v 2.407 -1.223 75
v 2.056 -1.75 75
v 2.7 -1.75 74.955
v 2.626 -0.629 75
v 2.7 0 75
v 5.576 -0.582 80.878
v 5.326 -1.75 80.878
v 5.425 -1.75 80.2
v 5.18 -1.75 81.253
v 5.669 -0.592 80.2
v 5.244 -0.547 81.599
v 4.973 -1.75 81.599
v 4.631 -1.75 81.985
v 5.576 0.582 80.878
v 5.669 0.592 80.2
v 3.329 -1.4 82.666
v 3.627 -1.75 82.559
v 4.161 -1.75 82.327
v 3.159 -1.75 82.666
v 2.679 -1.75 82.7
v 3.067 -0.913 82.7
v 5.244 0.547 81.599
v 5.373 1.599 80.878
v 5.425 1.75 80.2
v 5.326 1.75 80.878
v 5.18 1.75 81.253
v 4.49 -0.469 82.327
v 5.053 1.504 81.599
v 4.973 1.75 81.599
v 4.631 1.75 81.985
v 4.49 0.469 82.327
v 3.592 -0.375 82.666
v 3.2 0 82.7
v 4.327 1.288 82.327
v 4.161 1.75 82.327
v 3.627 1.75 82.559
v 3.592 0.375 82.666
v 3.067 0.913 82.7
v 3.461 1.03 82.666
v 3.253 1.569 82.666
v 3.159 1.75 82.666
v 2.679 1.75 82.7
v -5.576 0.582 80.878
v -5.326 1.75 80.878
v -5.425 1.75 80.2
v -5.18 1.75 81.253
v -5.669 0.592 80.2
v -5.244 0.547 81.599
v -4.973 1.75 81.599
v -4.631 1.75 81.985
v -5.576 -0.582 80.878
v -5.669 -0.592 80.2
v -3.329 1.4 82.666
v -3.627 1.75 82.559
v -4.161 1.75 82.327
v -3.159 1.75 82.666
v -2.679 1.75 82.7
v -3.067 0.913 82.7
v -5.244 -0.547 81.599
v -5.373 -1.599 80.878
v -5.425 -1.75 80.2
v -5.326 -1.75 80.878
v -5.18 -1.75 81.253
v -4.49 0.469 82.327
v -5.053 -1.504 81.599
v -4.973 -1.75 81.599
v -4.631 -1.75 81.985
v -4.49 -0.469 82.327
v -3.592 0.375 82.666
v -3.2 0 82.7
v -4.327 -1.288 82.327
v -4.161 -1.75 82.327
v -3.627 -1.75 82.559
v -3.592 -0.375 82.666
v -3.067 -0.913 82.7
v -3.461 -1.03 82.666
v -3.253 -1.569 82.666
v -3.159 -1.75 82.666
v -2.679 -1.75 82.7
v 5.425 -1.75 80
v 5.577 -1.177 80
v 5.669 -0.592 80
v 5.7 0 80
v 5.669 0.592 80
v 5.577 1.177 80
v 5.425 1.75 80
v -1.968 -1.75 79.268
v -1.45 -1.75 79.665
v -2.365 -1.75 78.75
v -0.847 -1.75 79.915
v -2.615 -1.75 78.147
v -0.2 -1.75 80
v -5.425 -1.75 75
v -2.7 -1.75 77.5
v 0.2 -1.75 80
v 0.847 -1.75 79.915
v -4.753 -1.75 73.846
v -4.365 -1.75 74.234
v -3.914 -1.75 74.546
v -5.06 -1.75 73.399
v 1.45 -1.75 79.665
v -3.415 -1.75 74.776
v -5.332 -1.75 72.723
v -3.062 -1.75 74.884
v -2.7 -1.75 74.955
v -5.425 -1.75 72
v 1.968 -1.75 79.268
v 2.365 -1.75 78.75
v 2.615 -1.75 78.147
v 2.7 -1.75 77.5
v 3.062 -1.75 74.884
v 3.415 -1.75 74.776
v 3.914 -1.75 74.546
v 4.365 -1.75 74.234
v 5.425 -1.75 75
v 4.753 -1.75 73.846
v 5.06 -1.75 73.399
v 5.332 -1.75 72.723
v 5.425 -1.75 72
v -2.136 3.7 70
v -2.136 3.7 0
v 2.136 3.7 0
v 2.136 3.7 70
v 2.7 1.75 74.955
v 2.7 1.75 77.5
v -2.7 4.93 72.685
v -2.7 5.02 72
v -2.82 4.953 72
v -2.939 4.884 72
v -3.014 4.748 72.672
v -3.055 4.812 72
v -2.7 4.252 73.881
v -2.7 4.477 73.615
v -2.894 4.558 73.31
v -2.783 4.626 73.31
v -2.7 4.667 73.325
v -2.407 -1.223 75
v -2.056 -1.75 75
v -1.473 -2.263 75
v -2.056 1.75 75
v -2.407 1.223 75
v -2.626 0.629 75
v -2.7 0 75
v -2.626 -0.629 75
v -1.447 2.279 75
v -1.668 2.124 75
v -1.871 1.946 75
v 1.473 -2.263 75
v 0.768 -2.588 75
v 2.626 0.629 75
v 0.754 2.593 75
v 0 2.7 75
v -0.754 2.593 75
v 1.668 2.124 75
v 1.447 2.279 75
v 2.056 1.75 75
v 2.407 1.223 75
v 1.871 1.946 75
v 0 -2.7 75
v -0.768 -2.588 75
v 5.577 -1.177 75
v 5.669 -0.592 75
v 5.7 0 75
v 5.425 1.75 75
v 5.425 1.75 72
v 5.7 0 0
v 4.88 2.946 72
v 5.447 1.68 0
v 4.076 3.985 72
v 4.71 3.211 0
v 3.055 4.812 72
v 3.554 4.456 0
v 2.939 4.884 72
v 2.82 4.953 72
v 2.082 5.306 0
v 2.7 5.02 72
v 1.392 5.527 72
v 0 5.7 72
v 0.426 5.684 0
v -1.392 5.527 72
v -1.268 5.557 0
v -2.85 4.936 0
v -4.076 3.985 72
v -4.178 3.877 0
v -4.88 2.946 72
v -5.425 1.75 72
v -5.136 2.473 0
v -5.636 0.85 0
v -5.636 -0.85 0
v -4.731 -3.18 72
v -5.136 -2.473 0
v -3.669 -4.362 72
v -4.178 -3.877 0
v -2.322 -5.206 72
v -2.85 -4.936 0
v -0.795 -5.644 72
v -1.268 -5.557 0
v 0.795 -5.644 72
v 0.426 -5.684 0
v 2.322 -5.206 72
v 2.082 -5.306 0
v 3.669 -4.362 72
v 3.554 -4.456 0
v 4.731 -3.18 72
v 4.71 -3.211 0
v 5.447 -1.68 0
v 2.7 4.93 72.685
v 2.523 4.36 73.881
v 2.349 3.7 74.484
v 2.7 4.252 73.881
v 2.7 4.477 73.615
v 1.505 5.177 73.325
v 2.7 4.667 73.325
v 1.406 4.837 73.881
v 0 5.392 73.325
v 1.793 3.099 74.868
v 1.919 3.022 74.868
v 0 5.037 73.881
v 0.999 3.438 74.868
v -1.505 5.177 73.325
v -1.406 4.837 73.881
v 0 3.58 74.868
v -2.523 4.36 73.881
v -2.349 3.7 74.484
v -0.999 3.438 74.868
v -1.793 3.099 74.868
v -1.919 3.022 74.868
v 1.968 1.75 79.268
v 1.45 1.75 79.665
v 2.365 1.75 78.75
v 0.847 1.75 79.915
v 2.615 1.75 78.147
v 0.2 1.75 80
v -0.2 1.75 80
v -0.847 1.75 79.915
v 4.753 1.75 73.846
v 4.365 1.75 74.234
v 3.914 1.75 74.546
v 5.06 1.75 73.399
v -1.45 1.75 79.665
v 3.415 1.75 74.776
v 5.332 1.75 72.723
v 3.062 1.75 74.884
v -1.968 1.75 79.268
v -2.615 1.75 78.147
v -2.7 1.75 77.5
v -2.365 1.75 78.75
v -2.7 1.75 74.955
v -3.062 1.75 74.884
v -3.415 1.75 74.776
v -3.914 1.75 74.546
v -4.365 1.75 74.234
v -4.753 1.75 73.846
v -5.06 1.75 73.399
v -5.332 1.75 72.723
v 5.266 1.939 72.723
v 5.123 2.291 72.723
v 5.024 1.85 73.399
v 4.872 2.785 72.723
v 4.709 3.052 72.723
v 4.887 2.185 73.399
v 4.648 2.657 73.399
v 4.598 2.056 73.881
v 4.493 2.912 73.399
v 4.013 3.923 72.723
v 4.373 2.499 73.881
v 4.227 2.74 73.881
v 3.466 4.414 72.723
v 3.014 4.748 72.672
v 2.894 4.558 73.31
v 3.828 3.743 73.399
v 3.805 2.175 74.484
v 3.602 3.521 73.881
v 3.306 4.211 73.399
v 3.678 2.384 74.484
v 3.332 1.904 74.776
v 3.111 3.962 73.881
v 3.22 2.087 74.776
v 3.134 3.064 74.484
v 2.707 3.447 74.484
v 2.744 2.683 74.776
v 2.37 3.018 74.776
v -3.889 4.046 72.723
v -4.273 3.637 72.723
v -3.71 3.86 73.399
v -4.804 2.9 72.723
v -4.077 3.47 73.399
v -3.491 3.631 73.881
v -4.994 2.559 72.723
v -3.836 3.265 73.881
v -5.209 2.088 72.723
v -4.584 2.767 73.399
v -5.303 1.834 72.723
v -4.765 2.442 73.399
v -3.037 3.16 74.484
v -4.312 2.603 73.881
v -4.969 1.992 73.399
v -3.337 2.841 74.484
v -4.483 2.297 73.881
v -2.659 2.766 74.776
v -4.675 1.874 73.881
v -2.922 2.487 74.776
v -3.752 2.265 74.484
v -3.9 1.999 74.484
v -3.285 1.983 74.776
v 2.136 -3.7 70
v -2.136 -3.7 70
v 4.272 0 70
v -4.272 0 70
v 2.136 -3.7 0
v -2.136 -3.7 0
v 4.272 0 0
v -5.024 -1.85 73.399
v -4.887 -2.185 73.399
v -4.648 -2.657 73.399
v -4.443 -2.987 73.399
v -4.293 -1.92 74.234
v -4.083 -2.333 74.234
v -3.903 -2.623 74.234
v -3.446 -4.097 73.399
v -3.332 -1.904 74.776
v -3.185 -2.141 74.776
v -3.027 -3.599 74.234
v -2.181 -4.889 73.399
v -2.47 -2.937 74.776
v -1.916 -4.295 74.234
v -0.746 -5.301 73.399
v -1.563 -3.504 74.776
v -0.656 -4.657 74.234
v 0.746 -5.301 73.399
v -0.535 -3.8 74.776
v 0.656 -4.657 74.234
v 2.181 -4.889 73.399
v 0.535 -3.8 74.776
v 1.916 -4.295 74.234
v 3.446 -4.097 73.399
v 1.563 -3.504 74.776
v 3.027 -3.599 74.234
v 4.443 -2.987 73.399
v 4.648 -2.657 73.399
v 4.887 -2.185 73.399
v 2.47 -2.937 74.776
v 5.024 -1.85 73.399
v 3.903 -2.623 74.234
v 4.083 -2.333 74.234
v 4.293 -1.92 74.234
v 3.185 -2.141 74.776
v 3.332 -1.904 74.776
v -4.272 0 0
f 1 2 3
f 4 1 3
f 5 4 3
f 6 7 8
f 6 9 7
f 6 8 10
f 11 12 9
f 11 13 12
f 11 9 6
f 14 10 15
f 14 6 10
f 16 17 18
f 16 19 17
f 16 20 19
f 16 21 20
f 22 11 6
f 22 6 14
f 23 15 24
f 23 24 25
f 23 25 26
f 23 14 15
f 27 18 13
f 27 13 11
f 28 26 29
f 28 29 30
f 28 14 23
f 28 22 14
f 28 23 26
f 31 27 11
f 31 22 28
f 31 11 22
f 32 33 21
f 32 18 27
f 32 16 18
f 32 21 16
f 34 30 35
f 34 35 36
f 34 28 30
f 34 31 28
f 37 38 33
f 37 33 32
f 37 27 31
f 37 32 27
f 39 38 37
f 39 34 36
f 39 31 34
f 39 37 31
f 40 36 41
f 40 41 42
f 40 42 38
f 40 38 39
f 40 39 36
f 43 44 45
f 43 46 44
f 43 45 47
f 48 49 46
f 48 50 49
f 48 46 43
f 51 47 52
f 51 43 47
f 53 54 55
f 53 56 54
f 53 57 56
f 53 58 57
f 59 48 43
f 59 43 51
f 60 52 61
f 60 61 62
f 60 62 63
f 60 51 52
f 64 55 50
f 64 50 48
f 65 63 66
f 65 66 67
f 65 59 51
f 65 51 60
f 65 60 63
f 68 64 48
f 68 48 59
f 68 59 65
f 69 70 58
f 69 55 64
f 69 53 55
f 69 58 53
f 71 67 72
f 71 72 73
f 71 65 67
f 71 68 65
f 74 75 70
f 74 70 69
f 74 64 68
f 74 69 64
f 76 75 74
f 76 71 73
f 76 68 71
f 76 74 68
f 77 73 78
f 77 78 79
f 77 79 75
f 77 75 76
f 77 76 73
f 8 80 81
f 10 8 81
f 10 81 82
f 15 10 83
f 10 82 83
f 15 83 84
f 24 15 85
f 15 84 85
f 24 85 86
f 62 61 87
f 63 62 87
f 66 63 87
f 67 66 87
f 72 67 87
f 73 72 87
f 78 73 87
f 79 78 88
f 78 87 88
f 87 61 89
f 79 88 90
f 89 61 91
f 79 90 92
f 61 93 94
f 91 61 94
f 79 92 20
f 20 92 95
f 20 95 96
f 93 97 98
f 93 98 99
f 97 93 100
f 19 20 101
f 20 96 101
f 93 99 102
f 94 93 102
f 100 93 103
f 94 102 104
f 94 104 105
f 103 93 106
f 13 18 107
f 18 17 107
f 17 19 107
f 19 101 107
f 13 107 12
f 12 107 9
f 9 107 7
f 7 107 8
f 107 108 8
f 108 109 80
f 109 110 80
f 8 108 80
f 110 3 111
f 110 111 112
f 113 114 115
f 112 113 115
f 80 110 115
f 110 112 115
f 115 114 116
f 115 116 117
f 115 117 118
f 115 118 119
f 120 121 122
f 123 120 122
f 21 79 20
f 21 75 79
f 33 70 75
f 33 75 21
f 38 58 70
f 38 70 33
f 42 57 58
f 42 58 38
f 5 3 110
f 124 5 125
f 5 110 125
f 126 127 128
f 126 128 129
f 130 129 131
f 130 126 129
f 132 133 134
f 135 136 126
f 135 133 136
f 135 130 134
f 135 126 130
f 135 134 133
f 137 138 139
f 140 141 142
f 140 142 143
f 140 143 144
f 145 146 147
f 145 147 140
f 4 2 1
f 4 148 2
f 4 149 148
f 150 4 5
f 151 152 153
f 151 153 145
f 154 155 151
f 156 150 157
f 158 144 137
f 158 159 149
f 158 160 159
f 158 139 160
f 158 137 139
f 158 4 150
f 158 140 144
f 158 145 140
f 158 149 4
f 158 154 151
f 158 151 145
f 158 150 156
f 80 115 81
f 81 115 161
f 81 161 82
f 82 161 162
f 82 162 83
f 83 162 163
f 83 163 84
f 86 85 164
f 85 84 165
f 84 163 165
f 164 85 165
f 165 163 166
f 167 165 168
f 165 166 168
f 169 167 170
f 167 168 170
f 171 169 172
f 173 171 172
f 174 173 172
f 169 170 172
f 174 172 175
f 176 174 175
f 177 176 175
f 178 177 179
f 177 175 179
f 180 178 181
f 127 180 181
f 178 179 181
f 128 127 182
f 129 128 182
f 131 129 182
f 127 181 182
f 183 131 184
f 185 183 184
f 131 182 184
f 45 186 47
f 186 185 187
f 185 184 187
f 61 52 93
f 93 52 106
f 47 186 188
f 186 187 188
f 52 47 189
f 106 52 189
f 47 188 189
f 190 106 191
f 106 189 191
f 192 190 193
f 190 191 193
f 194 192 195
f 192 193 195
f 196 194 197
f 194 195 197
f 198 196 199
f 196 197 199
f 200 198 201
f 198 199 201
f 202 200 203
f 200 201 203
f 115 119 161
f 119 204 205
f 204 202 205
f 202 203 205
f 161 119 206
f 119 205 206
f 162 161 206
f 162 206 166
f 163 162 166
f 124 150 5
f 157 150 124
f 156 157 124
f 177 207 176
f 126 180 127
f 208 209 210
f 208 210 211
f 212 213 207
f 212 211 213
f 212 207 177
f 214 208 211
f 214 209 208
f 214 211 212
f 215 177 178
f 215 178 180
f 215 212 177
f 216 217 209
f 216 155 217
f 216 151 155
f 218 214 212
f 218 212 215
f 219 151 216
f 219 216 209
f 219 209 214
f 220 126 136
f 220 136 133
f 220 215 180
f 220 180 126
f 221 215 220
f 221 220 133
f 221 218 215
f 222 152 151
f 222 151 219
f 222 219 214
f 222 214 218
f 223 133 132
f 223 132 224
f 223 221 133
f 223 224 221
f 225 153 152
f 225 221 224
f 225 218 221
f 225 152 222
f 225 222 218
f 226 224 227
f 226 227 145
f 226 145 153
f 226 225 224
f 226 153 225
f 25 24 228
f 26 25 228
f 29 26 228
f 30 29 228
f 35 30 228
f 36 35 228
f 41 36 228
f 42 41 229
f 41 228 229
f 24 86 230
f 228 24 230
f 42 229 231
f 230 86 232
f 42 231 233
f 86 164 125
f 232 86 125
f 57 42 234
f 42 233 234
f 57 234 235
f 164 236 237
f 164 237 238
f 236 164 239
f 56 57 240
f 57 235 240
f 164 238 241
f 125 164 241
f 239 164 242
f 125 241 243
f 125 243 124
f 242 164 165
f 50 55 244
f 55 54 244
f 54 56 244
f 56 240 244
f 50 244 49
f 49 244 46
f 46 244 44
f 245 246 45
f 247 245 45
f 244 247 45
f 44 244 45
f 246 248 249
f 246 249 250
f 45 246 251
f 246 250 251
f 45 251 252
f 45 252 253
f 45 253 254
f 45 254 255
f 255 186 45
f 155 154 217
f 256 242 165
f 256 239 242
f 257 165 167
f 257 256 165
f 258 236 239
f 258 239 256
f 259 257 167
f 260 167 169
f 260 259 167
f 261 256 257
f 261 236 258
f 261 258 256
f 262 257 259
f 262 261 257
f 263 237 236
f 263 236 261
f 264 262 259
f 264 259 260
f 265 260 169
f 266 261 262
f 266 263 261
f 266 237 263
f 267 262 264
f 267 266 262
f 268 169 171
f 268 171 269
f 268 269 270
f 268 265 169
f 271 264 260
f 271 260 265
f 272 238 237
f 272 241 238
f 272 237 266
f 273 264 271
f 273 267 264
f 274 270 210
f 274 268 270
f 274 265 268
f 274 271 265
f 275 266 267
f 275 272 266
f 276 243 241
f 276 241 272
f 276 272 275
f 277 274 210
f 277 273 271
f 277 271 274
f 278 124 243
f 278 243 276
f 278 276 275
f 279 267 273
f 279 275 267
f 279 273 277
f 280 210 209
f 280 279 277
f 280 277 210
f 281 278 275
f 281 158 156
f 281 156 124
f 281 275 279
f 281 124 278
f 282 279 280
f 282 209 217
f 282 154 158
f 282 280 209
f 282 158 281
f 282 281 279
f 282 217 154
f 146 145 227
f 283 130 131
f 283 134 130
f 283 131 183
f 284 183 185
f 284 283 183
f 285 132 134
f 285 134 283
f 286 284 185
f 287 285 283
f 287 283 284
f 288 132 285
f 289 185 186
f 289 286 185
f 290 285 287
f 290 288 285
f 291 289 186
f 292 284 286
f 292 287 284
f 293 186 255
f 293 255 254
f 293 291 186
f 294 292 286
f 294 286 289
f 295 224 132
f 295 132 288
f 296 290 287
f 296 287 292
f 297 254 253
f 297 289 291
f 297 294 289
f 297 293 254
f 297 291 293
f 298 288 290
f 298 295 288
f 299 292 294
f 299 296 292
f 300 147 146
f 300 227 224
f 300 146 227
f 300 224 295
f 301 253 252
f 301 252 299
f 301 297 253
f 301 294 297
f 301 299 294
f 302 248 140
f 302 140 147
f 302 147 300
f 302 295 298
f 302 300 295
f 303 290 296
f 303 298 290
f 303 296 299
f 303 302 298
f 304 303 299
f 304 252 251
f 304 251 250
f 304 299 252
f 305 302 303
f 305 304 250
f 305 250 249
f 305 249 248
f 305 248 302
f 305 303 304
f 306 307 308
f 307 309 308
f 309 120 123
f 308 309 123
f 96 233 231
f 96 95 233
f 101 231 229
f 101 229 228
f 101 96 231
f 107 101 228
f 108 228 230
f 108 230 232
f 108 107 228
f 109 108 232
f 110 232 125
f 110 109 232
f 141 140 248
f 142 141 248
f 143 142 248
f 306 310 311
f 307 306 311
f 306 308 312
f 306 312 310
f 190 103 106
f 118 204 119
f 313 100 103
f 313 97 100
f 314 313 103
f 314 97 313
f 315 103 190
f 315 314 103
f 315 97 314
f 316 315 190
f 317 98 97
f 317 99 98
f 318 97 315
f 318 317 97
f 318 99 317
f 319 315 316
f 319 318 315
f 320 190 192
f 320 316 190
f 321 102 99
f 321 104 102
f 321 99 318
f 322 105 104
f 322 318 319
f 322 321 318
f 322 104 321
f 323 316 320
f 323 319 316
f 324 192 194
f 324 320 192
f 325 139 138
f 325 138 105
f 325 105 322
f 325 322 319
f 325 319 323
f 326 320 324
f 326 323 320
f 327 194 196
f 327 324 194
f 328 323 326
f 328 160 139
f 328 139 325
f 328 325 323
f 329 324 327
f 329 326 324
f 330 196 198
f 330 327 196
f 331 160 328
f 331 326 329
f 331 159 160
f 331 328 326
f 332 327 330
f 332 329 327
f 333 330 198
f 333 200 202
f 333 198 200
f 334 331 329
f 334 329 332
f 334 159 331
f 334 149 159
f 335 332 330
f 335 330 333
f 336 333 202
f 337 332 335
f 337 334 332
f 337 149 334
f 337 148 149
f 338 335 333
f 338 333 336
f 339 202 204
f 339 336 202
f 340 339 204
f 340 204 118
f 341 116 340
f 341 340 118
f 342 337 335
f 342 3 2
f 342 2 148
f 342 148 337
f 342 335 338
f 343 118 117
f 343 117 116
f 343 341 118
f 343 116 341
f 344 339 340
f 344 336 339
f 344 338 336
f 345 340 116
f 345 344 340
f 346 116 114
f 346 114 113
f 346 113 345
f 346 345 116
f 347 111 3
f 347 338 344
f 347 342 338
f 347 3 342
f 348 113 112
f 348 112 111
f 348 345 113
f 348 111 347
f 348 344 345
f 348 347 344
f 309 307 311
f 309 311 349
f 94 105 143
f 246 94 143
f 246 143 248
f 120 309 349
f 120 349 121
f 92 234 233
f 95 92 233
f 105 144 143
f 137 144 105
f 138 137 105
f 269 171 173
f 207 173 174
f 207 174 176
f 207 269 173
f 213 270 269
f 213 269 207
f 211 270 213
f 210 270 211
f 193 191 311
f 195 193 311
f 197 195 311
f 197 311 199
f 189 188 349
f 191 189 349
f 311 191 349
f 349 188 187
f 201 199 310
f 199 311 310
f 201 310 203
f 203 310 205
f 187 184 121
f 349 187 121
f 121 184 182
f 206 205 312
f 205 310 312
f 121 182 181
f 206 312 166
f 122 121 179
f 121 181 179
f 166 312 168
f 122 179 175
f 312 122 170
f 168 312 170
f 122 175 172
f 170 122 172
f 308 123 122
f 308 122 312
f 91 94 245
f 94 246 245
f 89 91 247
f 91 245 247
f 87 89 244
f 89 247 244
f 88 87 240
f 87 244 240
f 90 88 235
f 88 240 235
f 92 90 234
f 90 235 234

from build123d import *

# Parameters (mm, degrees)
F0_R         = 5.7
F1_DEPTH     = 70
F2_R         = 5.7
F3_DEPTH     = 5
F5_DEPTH     = 5
F6_W         = 5.4
F6_H         = 3.5
F7_DEPTH     = 2.7
F8_R         = 2.5
F9_T4_ANGLE  = 295.1748403761
F9_T9_ANGLE  = 295.1748403761
F9_T15_ANGLE = 295.1748403761
F9_T20_ANGLE = 295.1748403761
F9_T25_ANGLE = 295.1748403761
F9_T31_ANGLE = 295.1748403761


# Not quite as in the source:
# - a fillet or chamfer that OpenCascade refuses, or shapes differently, is made with other operations: its cross-section is extruded or revolved along the edge and cut away or added


with BuildPart() as f1:
    # F0 (on Top) → F1 (new body)
    with BuildSketch(Plane.XY):
        Circle(F0_R)
        Polygon((-2.136195996, -3.7), (-4.272391992, 0), (-2.136195996, 3.7), (2.136195996, 3.7), (4.272391992, 0), (2.136195996, -3.7), align=None, mode=Mode.SUBTRACT)
    extrude(amount=F1_DEPTH)

    # F2 (on face) → F3 (join)
    with BuildSketch(Plane.XY.offset(70)):
        Circle(F2_R)
        Polygon((2.136195996, -3.7), (-2.136195996, -3.7), (-4.272391992, 0), (-2.136195996, 3.7), (2.136195996, 3.7), (4.272391992, 0), align=None, mode=Mode.SUBTRACT)
        Polygon((-4.272391992, 0), (-2.136195996, -3.7), (2.136195996, -3.7), (4.272391992, 0), (2.136195996, 3.7), (-2.136195996, 3.7), align=None)
    extrude(amount=F3_DEPTH)

    # F4 (on face) → F5 (join)
    with BuildSketch(Plane.XY.offset(75)):
        with BuildLine():
            Line((-5.4247119739, -1.75), (-2.7, -1.75))
            Line((-2.7, -1.75), (-2.7, 1.75))
            Line((-2.7, 1.75), (-5.4247119739, 1.75))
            ThreePointArc((-5.4247119739, 1.75), (-5.7, 0), (-5.4247119739, -1.75))
        make_face()
        with BuildLine():
            Line((2.7, -1.75), (5.4247119739, -1.75))
            ThreePointArc((5.4247119739, -1.75), (5.6307574202, -0.8857600546), (5.7, 0))
            ThreePointArc((5.7, 0), (5.6307574202, 0.8857600546), (5.4247119739, 1.75))
            Line((5.4247119739, 1.75), (2.7, 1.75))
            Line((2.7, 1.75), (2.7, -1.75))
        make_face()
    extrude(amount=F5_DEPTH)

    # F6 (on face) → F7 (join)
    with BuildSketch(Plane.XY.offset(80)):
        Rectangle(F6_W, F6_H)
        with BuildLine():
            Line((-2.7, -1.75), (-2.7, 1.75))
            Line((-2.7, 1.75), (-5.4247119739, 1.75))
            ThreePointArc((-5.4247119739, 1.75), (-5.7, 0), (-5.4247119739, -1.75))
            Line((-5.4247119739, -1.75), (-2.7, -1.75))
        make_face()
        with BuildLine():
            Line((5.4247119739, 1.75), (2.7, 1.75))
            Line((2.7, 1.75), (2.7, -1.75))
            Line((2.7, -1.75), (5.4247119739, -1.75))
            ThreePointArc((5.4247119739, -1.75), (5.7, 0), (5.4247119739, 1.75))
        make_face()
    extrude(amount=F7_DEPTH)

    # F8
    f8_edges = [f1.edges().sort_by_distance(p)[0] for p in [
        (-5.7, 0, 82.7),
        (2.7, 0, 80),
        (-2.7, 0, 80),
        (5.7, 0, 82.7),
    ]]
    fillet(f8_edges, radius=F8_R)

    # F9: fillet of radius 3 on 3 edges, made by hand


with BuildPart() as f9_tool2:
    # F9_s3 → F9_t4 (revolve)
    with BuildSketch(Plane(origin=(0, 0, 0), x_dir=(0, 0, 1), z_dir=(0.8442102595, 0.536012162, 0))):
        with BuildLine():
            ThreePointArc((72, -5.7), (74.1213203436, -4.8213203436), (75, -2.7))
            Line((75, -2.7), (75, -5.7))
            Line((75, -5.7), (72, -5.7))
        make_face()
    revolve(axis=Axis((0, 0, 75), (0, 0, 1)), revolution_arc=F9_T4_ANGLE)

    split(bisect_by=Plane.XZ.offset(-1.75), keep=Keep.BOTTOM)


with BuildPart() as f1_1:
    add(f1.part)

    # F9_t1: cut F9_tool2
    add(f9_tool2.part, mode=Mode.SUBTRACT)


with BuildPart() as f9_tool7:
    # F9_s8 → F9_t9 (revolve)
    with BuildSketch(Plane(origin=(0, 0, 0), x_dir=(0, 0, 1), z_dir=(0.8442102595, 0.536012162, 0))):
        with BuildLine():
            ThreePointArc((72, -5.7), (74.1213203436, -4.8213203436), (75, -2.7))
            Line((75, -2.7), (75, -5.7))
            Line((75, -5.7), (72, -5.7))
        make_face()
    revolve(axis=Axis((0, 0, 75), (0, 0, 1)), revolution_arc=F9_T9_ANGLE)

    split(bisect_by=Plane.YZ.offset(-2.7), keep=Keep.TOP)

    split(bisect_by=Plane.YZ.offset(2.7), keep=Keep.BOTTOM)


with BuildPart() as f1_2:
    add(f1_1.part)

    # F9_t6: cut F9_tool7
    add(f9_tool7.part, mode=Mode.SUBTRACT)


with BuildPart() as f9_tool13:
    # F9_s14 → F9_t15 (revolve)
    with BuildSketch(Plane(origin=(0, 0, 0), x_dir=(0, 0, 1), z_dir=(0.8442102595, 0.536012162, 0))):
        with BuildLine():
            ThreePointArc((72, -5.7), (74.1213203436, -4.8213203436), (75, -2.7))
            Line((75, -2.7), (75, -5.7))
            Line((75, -5.7), (72, -5.7))
        make_face()
    revolve(axis=Axis((0, 0, 75), (0, 0, 1)), revolution_arc=F9_T15_ANGLE)

    split(bisect_by=Plane.XZ.offset(1.75), keep=Keep.TOP)


with BuildPart() as f1_3:
    add(f1_2.part)

    # F9_t12: cut F9_tool13
    add(f9_tool13.part, mode=Mode.SUBTRACT)


with BuildPart() as f9_tool18:
    # F9_s19 → F9_t20 (revolve)
    with BuildSketch(Plane(origin=(0, 0, 0), x_dir=(0, 0, 1), z_dir=(-0.8442102595, -0.536012162, 0))):
        with BuildLine():
            ThreePointArc((72, -5.7), (74.1213203436, -4.8213203436), (75, -2.7))
            Line((75, -2.7), (75, -5.7))
            Line((75, -5.7), (72, -5.7))
        make_face()
    revolve(axis=Axis((0, 0, 75), (0, 0, 1)), revolution_arc=F9_T20_ANGLE)

    split(bisect_by=Plane.XZ.offset(1.75), keep=Keep.TOP)


with BuildPart() as f1_4:
    add(f1_3.part)

    # F9_t17: cut F9_tool18
    add(f9_tool18.part, mode=Mode.SUBTRACT)


with BuildPart() as f9_tool23:
    # F9_s24 → F9_t25 (revolve)
    with BuildSketch(Plane(origin=(0, 0, 0), x_dir=(0, 0, 1), z_dir=(-0.8442102595, -0.536012162, 0))):
        with BuildLine():
            ThreePointArc((72, -5.7), (74.1213203436, -4.8213203436), (75, -2.7))
            Line((75, -2.7), (75, -5.7))
            Line((75, -5.7), (72, -5.7))
        make_face()
    revolve(axis=Axis((0, 0, 75), (0, 0, 1)), revolution_arc=F9_T25_ANGLE)

    split(bisect_by=Plane.YZ.offset(-2.7), keep=Keep.TOP)

    split(bisect_by=Plane.YZ.offset(2.7), keep=Keep.BOTTOM)


with BuildPart() as f1_5:
    add(f1_4.part)

    # F9_t22: cut F9_tool23
    add(f9_tool23.part, mode=Mode.SUBTRACT)


with BuildPart() as f9_tool29:
    # F9_s30 → F9_t31 (revolve)
    with BuildSketch(Plane(origin=(0, 0, 0), x_dir=(0, 0, 1), z_dir=(-0.8442102595, -0.536012162, 0))):
        with BuildLine():
            ThreePointArc((72, -5.7), (74.1213203436, -4.8213203436), (75, -2.7))
            Line((75, -2.7), (75, -5.7))
            Line((75, -5.7), (72, -5.7))
        make_face()
    revolve(axis=Axis((0, 0, 75), (0, 0, 1)), revolution_arc=F9_T31_ANGLE)

    split(bisect_by=Plane.XZ.offset(-1.75), keep=Keep.BOTTOM)


with BuildPart() as f1_6:
    add(f1_5.part)

    # F9_t28: cut F9_tool29
    add(f9_tool29.part, mode=Mode.SUBTRACT)


solid = f1_6.part
